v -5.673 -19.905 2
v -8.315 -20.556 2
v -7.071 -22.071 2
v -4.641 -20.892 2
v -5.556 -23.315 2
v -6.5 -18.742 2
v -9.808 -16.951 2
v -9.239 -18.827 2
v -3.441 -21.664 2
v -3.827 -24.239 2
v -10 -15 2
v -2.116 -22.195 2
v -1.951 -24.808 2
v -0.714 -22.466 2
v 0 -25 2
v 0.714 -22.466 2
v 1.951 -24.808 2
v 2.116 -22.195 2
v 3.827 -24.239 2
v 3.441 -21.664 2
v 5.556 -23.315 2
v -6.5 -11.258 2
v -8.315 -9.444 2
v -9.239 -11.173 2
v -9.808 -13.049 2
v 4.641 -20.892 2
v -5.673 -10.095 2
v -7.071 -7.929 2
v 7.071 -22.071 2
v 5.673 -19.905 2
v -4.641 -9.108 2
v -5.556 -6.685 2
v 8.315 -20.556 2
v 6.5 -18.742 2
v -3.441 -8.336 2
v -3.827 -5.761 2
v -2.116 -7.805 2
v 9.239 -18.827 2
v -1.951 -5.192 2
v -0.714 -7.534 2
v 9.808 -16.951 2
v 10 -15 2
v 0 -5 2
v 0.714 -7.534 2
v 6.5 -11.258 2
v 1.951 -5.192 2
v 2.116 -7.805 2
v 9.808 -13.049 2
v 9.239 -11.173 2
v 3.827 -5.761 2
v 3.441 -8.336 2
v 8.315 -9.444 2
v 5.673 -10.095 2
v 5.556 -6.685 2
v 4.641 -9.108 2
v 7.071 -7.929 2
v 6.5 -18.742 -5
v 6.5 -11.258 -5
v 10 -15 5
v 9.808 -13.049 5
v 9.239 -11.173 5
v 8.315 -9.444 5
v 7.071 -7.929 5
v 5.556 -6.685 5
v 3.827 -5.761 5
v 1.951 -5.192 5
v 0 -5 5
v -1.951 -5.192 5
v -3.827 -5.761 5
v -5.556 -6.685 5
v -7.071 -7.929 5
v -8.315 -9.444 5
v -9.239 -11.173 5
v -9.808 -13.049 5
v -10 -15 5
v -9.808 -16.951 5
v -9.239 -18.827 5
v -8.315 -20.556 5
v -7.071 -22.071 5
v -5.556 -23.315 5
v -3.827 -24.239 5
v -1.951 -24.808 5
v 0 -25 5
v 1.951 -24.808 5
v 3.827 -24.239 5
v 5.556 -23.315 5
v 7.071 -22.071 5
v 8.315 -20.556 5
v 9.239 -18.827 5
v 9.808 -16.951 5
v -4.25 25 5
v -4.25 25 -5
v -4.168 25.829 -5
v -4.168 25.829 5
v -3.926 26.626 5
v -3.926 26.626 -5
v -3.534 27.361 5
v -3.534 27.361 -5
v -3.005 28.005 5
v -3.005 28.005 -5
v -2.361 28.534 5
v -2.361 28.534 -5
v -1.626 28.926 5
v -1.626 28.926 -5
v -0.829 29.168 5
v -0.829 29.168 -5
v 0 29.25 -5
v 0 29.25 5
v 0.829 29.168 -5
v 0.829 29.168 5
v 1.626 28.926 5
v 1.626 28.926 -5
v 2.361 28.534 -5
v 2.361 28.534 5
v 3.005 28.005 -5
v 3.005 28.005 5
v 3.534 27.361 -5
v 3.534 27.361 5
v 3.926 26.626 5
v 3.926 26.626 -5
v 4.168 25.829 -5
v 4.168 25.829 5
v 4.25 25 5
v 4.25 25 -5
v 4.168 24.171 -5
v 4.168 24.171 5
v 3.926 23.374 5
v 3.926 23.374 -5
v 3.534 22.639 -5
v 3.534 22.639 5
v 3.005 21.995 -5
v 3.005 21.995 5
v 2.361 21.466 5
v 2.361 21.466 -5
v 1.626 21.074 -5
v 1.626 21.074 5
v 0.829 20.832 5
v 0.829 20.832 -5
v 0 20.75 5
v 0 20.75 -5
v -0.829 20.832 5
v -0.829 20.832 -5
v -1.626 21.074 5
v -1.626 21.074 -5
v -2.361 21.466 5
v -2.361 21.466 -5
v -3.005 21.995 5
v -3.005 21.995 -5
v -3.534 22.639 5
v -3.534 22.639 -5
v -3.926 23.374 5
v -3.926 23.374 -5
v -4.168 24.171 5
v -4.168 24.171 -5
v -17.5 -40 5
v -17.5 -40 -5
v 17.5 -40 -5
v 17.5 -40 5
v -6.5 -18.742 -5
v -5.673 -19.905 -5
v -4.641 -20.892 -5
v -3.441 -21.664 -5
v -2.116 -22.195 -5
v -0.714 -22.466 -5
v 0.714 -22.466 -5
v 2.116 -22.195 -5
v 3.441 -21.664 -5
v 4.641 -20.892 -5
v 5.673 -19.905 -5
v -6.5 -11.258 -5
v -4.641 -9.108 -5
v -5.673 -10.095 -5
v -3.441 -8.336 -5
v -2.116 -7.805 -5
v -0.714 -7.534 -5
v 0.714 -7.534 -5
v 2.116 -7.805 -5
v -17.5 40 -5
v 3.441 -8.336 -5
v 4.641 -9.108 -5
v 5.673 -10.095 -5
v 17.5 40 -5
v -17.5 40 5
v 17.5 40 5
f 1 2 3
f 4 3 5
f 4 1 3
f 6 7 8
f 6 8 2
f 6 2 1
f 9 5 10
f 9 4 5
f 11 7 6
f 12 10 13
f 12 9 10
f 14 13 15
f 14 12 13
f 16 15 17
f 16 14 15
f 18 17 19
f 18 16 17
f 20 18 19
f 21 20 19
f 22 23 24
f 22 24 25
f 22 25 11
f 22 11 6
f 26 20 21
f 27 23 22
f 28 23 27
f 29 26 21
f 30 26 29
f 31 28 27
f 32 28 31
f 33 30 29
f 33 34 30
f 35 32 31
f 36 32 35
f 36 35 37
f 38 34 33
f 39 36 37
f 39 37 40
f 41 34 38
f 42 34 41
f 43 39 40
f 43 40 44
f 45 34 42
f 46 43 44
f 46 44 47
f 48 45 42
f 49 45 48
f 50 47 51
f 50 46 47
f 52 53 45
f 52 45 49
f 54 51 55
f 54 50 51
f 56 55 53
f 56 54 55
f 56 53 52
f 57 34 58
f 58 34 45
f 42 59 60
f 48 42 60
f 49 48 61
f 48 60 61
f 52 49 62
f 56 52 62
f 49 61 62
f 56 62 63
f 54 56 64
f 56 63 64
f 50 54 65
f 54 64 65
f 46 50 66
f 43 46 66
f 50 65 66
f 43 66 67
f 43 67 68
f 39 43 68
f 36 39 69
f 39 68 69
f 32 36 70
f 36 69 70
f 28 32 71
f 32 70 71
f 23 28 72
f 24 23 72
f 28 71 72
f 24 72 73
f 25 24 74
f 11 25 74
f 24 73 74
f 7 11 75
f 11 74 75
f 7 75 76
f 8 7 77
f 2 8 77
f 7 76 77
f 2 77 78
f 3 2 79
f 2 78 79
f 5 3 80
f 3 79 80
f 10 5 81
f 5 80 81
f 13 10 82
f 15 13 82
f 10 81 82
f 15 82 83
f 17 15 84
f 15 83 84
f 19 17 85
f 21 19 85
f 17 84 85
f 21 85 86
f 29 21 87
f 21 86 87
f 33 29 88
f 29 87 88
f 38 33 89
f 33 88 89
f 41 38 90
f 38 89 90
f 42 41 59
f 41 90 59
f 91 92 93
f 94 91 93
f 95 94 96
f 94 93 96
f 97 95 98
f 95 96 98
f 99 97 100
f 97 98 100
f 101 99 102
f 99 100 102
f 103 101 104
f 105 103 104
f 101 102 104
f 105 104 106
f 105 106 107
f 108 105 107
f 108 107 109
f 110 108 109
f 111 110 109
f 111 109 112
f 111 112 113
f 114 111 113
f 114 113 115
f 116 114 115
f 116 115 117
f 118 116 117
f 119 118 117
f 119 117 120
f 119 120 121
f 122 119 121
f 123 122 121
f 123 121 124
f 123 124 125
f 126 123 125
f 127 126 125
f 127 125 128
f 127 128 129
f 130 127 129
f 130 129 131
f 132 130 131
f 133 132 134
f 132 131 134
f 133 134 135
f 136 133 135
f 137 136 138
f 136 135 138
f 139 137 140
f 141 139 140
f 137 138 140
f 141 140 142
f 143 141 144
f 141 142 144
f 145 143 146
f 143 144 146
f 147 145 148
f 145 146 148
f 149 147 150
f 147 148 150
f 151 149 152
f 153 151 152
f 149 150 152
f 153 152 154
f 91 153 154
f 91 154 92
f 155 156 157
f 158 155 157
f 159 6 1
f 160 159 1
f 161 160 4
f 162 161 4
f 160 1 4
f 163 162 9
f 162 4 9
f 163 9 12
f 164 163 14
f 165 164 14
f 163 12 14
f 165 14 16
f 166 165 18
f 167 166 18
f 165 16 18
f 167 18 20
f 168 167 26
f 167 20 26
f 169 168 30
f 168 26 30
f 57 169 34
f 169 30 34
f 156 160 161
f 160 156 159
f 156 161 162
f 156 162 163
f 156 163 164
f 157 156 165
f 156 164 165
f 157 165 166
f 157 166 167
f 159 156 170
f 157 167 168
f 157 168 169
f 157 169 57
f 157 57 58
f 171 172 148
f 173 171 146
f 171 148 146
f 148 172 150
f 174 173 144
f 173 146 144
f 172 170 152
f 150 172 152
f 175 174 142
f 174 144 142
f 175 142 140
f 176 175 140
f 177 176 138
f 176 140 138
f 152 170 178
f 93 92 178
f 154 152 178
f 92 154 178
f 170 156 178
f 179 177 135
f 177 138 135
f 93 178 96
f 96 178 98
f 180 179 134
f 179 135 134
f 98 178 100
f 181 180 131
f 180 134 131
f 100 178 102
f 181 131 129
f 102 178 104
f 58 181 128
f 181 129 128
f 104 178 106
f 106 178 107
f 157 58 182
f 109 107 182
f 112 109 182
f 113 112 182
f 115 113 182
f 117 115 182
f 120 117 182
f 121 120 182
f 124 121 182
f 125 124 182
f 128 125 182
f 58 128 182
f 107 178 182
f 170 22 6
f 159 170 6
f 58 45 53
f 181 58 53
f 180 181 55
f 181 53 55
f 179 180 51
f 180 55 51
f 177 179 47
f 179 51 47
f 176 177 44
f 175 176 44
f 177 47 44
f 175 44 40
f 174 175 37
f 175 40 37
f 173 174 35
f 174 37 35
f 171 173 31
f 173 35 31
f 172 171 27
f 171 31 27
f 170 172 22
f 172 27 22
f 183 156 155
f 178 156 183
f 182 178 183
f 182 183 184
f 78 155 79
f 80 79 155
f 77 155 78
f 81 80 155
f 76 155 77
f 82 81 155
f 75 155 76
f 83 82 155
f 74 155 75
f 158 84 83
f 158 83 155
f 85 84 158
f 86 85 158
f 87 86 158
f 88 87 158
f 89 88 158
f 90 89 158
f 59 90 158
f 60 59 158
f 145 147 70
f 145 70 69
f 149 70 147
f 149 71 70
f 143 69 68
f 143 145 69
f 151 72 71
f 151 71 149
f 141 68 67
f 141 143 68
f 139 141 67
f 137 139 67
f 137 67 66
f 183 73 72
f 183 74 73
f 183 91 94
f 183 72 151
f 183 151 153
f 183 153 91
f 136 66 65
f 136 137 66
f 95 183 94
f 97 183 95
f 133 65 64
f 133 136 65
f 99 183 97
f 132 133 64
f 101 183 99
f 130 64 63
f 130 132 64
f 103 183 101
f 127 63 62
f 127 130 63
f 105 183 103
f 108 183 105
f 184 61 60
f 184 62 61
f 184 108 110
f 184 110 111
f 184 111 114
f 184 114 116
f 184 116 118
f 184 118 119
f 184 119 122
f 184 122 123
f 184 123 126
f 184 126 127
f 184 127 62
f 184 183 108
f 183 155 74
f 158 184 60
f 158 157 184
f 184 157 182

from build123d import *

# Parameters (mm, degrees)
FLANGE_BASE1_START             = -5
FLANGE_BASE1_OUTLINE_W         = 35
FLANGE_BASE1_OUTLINE_H         = 80
FLANGE_BASE1_DEPTH             = 10
FURO_ROSCADO_DE_M10X1_51_D     = 8.5
FURO_ROSCADO_DE_M10X1_51_DEPTH = 29.946342369
FURO_ROSCADO_DE_M10X1_51_TIP   = 2.553657631
ESBO_O9_R                      = 10
CORTE_EXTRUS_O2_DEPTH          = 3
CORTE_EXTRUS_O3_DEPTH          = 45.218208919


# Read off the part's stored shape, not the designer's step: Flange-base1
with BuildPart() as part:
    # Flange-base1 outline → Flange-base1 (new body)
    with BuildSketch(Plane.XY.offset(FLANGE_BASE1_START)):
        Rectangle(FLANGE_BASE1_OUTLINE_W, FLANGE_BASE1_OUTLINE_H)
    extrude(amount=FLANGE_BASE1_DEPTH)

    # Furo roscado de M10x1.51
    with Locations(Plane.XY.offset(5)):
        with Locations((0, 25)):
            Hole(FURO_ROSCADO_DE_M10X1_51_D / 2, depth=FURO_ROSCADO_DE_M10X1_51_DEPTH)
            with Locations((0, 0, -(FURO_ROSCADO_DE_M10X1_51_DEPTH + FURO_ROSCADO_DE_M10X1_51_TIP / 2))):  # 118° drill point
                Cone(0, FURO_ROSCADO_DE_M10X1_51_D / 2, FURO_ROSCADO_DE_M10X1_51_TIP, mode=Mode.SUBTRACT)

    # Esboço9 → Corte-extrusão2 (cut)
    with BuildSketch(Plane.XY.offset(5)):
        with Locations((0, -15)):
            Circle(ESBO_O9_R)
    extrude(amount=-CORTE_EXTRUS_O2_DEPTH, mode=Mode.SUBTRACT)

    # Esboço10 → Corte-extrusão3 (cut, through all)
    with BuildSketch(Plane.XY.offset(2)):
        with BuildLine():
            Line((-6.5, -11.258342613), (-6.5, -18.741657387))
            ThreePointArc((-6.5, -18.741657387), (0, -22.5), (6.5, -18.741657387))
            Line((6.5, -18.741657387), (6.5, -11.258342613))
            ThreePointArc((6.5, -11.258342613), (0, -7.5), (-6.5, -11.258342613))
        make_face()
    extrude(amount=-CORTE_EXTRUS_O3_DEPTH, mode=Mode.SUBTRACT)


solid = part.part
